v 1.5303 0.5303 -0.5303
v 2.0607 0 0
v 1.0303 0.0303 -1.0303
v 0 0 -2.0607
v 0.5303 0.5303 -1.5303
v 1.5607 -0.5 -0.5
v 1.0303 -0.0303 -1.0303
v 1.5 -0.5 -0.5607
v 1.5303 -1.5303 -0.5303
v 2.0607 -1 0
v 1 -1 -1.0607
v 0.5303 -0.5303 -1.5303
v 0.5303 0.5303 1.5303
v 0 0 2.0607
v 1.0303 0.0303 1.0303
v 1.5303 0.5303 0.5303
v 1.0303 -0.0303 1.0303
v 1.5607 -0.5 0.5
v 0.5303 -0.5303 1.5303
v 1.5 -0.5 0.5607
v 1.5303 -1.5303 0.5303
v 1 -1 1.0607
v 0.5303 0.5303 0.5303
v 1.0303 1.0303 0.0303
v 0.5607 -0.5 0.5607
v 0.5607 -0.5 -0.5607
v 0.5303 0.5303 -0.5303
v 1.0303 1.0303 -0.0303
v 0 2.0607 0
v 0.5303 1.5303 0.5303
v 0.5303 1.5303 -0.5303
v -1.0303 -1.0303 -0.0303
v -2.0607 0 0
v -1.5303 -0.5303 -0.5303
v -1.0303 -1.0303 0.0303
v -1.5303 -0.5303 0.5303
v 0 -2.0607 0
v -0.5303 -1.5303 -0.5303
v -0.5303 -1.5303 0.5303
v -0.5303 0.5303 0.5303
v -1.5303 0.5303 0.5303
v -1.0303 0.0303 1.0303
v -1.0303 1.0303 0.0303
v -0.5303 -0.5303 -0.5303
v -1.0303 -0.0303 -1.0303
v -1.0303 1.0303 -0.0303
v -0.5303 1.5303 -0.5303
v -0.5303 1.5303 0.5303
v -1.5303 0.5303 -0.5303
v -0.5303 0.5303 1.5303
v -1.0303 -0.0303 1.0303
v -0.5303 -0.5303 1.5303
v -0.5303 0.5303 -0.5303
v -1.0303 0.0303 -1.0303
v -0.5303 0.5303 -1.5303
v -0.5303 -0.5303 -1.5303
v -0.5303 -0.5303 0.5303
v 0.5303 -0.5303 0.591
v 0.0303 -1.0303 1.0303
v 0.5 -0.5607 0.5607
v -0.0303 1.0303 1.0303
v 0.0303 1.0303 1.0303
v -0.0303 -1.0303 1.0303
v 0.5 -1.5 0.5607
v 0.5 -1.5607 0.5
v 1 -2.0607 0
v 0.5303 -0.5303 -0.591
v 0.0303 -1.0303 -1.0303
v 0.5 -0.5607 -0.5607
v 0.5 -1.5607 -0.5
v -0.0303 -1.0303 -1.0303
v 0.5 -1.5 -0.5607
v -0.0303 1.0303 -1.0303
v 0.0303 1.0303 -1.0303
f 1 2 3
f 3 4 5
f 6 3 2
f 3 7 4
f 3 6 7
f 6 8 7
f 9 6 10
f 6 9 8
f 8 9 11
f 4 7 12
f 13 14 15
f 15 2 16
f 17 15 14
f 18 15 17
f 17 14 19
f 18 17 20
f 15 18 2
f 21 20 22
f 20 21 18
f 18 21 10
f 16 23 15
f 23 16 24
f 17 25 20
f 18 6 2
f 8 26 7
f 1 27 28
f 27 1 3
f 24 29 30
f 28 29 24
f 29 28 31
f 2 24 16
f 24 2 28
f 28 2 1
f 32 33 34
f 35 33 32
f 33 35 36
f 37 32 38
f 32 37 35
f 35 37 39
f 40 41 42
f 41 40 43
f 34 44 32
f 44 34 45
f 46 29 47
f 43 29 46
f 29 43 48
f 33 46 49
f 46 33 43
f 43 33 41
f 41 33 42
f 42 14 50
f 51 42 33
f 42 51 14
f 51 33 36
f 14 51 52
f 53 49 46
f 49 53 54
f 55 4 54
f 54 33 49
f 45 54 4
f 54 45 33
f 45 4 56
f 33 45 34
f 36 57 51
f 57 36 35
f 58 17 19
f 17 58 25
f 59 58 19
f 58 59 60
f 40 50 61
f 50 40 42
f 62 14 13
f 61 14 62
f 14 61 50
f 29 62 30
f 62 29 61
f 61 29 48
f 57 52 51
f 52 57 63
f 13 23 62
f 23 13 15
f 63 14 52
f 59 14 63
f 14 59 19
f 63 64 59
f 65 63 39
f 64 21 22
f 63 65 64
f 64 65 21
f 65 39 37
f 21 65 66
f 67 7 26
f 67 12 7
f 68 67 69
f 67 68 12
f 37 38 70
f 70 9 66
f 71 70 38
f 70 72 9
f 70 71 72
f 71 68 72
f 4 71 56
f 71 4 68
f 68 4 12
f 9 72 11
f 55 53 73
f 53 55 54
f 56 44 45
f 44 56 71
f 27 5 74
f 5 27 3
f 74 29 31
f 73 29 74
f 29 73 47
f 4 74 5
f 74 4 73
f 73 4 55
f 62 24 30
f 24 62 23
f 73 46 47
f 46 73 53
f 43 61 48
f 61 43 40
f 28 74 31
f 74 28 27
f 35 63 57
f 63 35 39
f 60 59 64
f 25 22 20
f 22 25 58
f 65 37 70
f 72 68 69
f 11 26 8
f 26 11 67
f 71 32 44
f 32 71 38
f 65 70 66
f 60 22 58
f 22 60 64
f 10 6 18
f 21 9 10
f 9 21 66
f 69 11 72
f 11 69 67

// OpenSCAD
module octahedron() {
    
     octo_points = [
        [0, -1, 0], // belt
        [ 1, 0, 0], 
        [ 0,  1, 0], 
        [-1,  0, 0], 
        [0, 0, 1], // top
        [0, 0, -1], // bottom
    ];

    octo_faces = [
        [0, 1, 4], // top pyramid
        [1, 2, 4],
        [2, 3, 4],
        [3, 0, 4],
        [1, 0, 5], // bottom pyramid
        [2, 1, 5],
        [3, 2, 5],
        [0, 3, 5],
    ];

    polyhedron(
        points = octo_points,
        faces = octo_faces
    );
}


module RD() {
    C0 = 0.530330085889910643300633271579;
    C1 = 1.06066017177982128660126654316;

    // 4 sided faces = 12
    vertices = [
    [0.0, 0.0,  C1],
    [0.0, 0.0, -C1],
    [ C1, 0.0, 0.0],
    [-C1, 0.0, 0.0],
    [0.0,  C1, 0.0],
    [0.0, -C1, 0.0],
    [ C0,  C0,  C0],
    [ C0,  C0, -C0],
    [ C0, -C0,  C0],
    [ C0, -C0, -C0],
    [-C0,  C0,  C0],
    [-C0,  C0, -C0],
    [-C0, -C0,  C0],
    [-C0, -C0, -C0]];
    faces = [
    [  2 ,  8,  0,  6],
    [  4 ,  7,  2,  6],
    [  0 , 10,  4,  6],
    [  2 ,  7,  1,  9],
    [  5 ,  8,  2,  9],
    [  1 , 13,  5,  9],
    [  3 , 13,  1, 11],
    [  4 , 10,  3, 11],
    [  1 ,  7,  4, 11],
    [  3 , 10,  0, 12],
    [  5 , 13,  3, 12],
    [  0 ,  8,  5, 12]];
    
    polyhedron(    points = vertices, faces = faces);
    
    
}

translate([1, 0, 0]) RD();
translate([-1, 0, 0]) RD();
translate([0, 0, 1]) RD();
translate([0, 0, -1]) RD();
translate([0, 1, 0]) RD();
translate([0, -1, 0]) RD();

translate([1, -1, 0]) RD();


module octoflake(i, size, center){
    
    if (i == 0){
        translate(center) scale(size) octahedron();
    } else {
        octoflake(i-1, size/2, center + 1/2 * size * [0, -1, 0]);
        octoflake(i-1, size/2, center + 1/2 * size * [1, 0, 0]);
        octoflake(i-1, size/2, center + 1/2 * size * [0, 1, 0]);
        octoflake(i-1, size/2, center + 1/2 * size * [-1, 0, 0]);
        octoflake(i-1, size/2, center + 1/2 * size * [0, 0, 1]);
        octoflake(i-1, size/2, center + 1/2 * size * [0, 0, -1]);
    }
    
    
}
//
//
//// source=coordinates form=solid id =RhombicDodecahedron
//solid_1 = RhombicDodecahedron();
//
//scale(20) show_solid(solid_1);
//
//function Z() = RhombicDodecahedron();
//function RhombicDodecahedron() = 
//// source:  http://dmccooey.com/polyhedra/RhombicDodecahedron.txt
//// generated by  http://kitwallace.co.uk/3d/solid-index.xq
//let(C0 = 0.530330085889910643300633271579)
//let(C1 = 1.06066017177982128660126654316)
//polyhedron(name = "Rhombic Dodecahedron",
//// 4 sided faces = 12
//vertices = [
//[0.0, 0.0,  C1],
//[0.0, 0.0, -C1],
//[ C1, 0.0, 0.0],
//[-C1, 0.0, 0.0],
//[0.0,  C1, 0.0],
//[0.0, -C1, 0.0],
//[ C0,  C0,  C0],
//[ C0,  C0, -C0],
//[ C0, -C0,  C0],
//[ C0, -C0, -C0],
//[-C0,  C0,  C0],
//[-C0,  C0, -C0],
//[-C0, -C0,  C0],
//[-C0, -C0, -C0]],
//faces = [
//[  2 ,  8,  0,  6],
//[  4 ,  7,  2,  6],
//[  0 , 10,  4,  6],
//[  2 ,  7,  1,  9],
//[  5 ,  8,  2,  9],
//[  1 , 13,  5,  9],
//[  3 , 13,  1, 11],
//[  4 , 10,  3, 11],
//[  1 ,  7,  4, 11],
//[  3 , 10,  0, 12],
//[  5 , 13,  3, 12],
//[  0 ,  8,  5, 12]]
//);
